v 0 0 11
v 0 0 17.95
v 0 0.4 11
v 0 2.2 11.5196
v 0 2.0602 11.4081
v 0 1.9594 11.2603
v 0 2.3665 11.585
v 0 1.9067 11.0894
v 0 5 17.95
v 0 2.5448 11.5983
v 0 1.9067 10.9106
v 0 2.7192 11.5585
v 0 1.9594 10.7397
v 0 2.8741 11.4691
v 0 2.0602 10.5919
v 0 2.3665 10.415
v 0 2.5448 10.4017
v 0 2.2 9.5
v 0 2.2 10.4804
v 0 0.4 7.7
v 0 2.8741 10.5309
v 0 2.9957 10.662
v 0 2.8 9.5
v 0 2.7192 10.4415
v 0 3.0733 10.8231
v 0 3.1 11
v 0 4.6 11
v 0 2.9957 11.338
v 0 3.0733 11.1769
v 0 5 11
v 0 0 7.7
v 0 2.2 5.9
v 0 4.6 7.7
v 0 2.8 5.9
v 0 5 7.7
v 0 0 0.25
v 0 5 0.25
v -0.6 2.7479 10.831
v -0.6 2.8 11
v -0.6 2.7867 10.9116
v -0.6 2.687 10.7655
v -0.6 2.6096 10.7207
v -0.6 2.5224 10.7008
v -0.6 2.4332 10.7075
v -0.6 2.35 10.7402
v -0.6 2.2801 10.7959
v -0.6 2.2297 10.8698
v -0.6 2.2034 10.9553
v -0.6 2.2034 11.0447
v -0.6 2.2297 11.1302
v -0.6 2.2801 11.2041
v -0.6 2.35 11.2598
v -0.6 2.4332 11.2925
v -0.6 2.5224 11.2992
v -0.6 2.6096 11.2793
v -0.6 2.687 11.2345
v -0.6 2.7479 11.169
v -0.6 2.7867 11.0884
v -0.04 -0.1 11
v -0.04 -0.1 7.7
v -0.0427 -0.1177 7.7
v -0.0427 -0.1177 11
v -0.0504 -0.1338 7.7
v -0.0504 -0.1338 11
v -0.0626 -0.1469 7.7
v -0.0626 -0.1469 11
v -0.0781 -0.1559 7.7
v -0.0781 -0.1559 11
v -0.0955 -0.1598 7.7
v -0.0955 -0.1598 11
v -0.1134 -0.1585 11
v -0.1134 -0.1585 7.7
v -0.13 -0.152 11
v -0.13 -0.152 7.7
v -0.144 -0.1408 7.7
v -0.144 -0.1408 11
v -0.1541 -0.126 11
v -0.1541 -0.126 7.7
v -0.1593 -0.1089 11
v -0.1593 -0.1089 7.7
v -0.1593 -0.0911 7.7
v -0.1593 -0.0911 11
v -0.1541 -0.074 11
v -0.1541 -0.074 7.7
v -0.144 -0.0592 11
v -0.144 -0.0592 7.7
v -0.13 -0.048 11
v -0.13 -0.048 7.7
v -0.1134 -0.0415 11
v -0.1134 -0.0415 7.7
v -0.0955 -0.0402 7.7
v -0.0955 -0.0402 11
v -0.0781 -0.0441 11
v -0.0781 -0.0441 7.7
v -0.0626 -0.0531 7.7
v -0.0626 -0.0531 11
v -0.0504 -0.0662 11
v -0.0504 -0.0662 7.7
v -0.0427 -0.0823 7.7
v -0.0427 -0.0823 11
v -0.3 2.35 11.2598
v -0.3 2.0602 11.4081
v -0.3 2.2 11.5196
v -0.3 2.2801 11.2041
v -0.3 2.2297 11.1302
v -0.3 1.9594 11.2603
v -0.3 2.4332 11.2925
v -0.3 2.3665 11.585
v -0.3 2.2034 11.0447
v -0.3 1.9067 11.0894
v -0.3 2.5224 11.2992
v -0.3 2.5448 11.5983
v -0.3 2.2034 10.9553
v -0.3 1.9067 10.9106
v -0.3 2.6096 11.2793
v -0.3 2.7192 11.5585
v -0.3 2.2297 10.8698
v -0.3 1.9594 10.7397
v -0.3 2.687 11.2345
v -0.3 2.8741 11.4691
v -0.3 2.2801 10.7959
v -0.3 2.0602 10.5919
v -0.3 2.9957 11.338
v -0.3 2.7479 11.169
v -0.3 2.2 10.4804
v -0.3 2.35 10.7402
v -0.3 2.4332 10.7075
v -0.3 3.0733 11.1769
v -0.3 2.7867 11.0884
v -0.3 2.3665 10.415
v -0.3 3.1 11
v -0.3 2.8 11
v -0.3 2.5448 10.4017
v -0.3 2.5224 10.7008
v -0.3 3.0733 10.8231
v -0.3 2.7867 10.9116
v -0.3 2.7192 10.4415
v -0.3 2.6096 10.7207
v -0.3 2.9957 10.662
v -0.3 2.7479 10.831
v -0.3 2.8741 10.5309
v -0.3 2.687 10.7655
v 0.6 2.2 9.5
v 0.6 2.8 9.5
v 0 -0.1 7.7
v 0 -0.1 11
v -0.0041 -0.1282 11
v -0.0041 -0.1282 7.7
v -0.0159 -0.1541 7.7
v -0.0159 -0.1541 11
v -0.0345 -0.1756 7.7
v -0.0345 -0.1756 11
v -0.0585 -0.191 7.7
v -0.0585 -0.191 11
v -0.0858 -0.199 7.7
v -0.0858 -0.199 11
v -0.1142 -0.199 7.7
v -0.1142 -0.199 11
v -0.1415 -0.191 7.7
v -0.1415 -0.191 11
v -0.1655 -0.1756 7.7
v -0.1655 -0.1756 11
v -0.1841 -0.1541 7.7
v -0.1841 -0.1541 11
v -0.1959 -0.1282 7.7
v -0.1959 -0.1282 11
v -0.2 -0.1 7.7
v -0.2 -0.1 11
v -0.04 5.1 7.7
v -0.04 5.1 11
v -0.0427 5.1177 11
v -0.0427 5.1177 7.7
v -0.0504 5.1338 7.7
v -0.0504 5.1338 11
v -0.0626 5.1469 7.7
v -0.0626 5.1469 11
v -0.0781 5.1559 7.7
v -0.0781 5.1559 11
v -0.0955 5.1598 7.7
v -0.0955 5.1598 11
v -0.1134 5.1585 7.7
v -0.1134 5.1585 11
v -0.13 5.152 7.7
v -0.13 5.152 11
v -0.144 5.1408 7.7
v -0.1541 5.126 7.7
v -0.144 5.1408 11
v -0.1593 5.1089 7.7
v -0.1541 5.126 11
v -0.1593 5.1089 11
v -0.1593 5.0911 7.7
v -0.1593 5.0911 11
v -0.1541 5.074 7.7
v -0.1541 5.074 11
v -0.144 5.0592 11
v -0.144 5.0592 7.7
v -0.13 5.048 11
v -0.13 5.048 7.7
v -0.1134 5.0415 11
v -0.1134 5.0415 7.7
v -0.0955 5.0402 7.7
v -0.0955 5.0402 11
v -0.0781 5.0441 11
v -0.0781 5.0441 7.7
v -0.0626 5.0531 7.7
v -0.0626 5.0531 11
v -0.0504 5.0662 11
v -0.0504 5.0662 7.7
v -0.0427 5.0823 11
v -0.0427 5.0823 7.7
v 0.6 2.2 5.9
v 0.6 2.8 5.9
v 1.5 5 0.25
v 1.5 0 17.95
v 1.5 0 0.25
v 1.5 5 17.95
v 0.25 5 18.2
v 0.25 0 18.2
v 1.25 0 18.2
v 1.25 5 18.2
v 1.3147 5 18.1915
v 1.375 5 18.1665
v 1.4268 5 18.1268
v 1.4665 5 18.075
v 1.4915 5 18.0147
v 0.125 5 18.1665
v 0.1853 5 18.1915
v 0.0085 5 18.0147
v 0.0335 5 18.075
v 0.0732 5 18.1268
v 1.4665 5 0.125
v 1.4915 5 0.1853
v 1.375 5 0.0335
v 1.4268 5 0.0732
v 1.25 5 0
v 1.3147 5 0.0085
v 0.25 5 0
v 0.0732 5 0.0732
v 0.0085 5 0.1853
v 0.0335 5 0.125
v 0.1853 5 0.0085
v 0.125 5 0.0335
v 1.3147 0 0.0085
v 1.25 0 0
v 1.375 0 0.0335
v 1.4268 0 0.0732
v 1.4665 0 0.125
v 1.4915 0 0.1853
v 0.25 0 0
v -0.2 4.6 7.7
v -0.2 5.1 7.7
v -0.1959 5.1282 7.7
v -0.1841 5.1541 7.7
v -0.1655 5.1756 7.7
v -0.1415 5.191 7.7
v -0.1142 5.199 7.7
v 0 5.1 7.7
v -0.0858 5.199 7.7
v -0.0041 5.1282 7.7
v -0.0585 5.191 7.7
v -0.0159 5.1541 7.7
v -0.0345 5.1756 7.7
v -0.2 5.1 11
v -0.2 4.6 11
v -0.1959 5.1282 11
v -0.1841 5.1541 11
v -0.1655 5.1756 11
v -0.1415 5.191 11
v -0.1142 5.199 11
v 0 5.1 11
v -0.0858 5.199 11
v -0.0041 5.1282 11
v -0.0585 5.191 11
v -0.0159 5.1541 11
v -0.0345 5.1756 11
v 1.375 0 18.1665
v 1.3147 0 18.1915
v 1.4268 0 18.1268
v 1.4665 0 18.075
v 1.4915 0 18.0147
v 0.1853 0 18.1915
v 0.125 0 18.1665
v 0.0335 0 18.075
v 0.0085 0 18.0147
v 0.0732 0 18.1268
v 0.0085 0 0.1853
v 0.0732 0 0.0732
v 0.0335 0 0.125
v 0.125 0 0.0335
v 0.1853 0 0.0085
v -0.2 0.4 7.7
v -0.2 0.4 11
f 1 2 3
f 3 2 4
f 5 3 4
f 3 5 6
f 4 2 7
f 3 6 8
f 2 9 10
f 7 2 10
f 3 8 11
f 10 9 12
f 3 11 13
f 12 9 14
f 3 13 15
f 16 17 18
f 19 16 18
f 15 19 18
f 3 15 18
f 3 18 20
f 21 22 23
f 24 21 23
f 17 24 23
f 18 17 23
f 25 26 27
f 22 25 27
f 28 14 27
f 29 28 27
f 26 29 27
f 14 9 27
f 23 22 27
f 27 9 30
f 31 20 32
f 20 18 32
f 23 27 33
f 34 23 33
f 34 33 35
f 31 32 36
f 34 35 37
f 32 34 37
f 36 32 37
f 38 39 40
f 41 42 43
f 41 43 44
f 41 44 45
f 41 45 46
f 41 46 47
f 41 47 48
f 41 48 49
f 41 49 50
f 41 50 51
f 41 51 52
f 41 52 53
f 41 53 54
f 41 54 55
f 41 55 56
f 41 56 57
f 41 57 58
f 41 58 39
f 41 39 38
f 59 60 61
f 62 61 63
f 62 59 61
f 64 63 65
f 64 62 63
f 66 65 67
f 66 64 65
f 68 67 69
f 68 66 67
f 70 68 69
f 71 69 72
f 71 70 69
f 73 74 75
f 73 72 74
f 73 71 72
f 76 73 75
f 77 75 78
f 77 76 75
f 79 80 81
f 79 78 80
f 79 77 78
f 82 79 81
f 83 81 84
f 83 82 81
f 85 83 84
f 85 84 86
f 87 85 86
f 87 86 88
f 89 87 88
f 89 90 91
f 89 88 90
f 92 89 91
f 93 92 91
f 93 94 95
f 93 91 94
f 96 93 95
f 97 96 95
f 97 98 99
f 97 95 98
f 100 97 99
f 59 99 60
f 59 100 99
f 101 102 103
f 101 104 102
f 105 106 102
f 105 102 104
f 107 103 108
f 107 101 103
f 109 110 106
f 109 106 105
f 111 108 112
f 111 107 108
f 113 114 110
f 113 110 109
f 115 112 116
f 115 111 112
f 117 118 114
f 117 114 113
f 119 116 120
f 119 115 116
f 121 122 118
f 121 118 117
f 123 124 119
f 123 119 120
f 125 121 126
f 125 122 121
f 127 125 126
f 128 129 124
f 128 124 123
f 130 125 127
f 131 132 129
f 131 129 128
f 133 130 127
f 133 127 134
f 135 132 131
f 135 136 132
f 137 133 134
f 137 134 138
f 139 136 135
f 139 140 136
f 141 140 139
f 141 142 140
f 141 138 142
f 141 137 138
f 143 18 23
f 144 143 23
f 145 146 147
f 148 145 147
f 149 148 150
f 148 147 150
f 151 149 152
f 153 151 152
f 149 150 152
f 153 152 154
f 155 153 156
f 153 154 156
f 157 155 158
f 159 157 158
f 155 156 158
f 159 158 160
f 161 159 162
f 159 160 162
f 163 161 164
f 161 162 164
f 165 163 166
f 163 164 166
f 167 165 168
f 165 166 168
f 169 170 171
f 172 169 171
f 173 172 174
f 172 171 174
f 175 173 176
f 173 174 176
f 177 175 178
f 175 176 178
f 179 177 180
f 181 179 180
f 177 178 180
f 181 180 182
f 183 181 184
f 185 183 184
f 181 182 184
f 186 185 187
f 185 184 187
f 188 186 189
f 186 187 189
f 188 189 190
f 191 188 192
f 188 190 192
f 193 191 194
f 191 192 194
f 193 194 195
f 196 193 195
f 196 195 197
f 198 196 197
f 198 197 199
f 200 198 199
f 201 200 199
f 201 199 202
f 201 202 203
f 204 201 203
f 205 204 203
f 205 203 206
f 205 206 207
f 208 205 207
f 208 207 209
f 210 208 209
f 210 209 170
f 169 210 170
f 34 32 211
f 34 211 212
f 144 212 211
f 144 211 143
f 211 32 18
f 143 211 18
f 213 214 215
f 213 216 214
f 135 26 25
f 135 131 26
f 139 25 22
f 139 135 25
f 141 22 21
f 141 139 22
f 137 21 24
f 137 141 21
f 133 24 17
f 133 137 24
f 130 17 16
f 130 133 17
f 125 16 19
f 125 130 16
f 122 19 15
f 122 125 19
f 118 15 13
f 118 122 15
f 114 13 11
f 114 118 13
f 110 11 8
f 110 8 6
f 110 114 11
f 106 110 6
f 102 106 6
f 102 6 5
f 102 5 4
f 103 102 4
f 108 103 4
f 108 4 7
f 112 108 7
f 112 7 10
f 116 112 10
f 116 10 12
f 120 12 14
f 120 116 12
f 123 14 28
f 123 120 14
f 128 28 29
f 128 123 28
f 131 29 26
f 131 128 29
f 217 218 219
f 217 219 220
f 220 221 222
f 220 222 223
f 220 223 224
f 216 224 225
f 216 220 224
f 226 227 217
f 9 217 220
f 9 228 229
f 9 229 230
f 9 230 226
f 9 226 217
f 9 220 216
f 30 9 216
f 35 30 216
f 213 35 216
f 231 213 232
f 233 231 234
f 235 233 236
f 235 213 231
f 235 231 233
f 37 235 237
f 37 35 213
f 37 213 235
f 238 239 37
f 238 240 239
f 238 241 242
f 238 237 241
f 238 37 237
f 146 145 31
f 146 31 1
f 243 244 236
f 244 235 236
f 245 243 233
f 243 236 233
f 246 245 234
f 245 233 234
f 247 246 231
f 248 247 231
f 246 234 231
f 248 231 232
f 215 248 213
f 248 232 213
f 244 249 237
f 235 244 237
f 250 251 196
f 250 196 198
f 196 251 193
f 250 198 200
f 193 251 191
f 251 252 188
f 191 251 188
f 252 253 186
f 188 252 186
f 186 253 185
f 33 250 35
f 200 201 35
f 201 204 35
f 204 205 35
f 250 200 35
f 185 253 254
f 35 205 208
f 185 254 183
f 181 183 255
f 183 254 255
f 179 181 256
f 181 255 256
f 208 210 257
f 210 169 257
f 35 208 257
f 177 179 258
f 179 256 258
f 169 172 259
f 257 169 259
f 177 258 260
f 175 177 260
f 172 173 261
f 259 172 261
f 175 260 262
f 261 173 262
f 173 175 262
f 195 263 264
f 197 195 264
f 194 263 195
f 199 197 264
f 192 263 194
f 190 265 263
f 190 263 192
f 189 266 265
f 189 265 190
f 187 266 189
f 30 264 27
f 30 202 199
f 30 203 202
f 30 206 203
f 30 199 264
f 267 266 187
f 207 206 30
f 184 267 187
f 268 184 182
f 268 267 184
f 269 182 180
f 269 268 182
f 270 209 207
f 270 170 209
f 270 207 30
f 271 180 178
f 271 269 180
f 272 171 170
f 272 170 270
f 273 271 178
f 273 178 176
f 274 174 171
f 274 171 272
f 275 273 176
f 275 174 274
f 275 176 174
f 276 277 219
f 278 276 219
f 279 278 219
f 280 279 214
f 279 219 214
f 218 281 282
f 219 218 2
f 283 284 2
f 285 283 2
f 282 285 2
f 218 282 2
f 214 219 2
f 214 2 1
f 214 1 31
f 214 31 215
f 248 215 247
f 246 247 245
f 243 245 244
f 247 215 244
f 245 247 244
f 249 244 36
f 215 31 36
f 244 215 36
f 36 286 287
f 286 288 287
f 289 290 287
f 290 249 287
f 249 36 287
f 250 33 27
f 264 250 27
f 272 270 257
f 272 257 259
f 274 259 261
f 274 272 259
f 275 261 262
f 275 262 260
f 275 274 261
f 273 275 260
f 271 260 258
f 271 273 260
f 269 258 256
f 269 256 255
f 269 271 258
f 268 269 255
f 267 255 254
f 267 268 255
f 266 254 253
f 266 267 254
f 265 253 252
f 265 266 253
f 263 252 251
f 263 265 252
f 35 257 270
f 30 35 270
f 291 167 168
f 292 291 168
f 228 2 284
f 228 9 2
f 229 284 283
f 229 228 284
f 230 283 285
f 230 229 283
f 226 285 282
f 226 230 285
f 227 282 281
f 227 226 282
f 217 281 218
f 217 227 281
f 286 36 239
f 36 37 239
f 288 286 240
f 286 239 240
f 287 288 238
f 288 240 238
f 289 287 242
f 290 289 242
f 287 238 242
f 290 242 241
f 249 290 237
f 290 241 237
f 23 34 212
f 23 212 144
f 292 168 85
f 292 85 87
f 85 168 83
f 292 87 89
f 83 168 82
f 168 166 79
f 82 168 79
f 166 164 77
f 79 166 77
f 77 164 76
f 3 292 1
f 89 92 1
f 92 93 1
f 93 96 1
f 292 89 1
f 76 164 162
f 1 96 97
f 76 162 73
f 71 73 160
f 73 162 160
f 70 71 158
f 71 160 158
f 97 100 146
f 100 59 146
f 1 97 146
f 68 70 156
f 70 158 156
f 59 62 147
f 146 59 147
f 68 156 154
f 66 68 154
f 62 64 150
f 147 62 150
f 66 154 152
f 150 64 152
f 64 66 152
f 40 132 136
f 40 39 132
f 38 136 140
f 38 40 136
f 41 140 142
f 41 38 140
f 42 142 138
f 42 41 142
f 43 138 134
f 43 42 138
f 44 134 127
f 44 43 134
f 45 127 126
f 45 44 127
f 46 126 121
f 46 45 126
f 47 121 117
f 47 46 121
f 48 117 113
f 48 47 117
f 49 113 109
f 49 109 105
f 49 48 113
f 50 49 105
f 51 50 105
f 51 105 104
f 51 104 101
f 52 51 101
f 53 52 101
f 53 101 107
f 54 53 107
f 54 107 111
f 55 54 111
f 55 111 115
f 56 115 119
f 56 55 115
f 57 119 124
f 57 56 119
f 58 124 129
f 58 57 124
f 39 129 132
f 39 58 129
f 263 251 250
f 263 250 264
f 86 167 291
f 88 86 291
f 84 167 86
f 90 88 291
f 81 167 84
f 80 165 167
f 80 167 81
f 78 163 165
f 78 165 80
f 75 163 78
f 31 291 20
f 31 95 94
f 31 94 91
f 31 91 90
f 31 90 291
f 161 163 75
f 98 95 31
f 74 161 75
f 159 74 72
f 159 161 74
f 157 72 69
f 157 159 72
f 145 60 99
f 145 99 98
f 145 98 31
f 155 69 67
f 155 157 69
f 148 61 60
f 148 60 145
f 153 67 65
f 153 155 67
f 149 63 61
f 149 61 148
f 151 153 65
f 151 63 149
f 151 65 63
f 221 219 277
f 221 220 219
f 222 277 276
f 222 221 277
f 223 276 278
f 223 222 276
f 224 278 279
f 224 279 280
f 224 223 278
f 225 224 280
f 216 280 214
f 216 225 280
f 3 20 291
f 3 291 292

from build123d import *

# Parameters (mm, degrees)
SKETCH2_W           = 18.2
SKETCH2_H           = 5
BOSS_EXTRUDE1_DEPTH = 1.5
SKETCH4_W           = 3.6
SKETCH4_H           = 0.6
CUT_EXTRUDE1_DEPTH  = 0.6
SKETCH5_W           = 3.3
SKETCH5_H           = 0.5
BOSS_EXTRUDE2_DEPTH = 0.2
BOSS_EXTRUDE5_DEPTH = 3.3
SKETCH9_R           = 0.06
CUT_EXTRUDE5_DEPTH  = 12
FILLET1_R           = 0.25


with BuildPart() as part:
    # Sketch2 → Boss-Extrude1 (new body)
    with BuildSketch(Plane(origin=(0, 0, 0), x_dir=(0, 0, -1), z_dir=(1, 0, 0))):
        with Locations((-9.1, 2.5)):
            Rectangle(SKETCH2_W, SKETCH2_H)
    extrude(amount=BOSS_EXTRUDE1_DEPTH)

    # Sketch3 → Revolve1 (revolve)
    with BuildSketch(Plane.XY.offset(11)):
        Polygon((0, 2.5), (0, 3.1), (-0.3, 3.1), (-0.3, 2.8), (-0.6, 2.8), (-0.6, 2.5), align=None)
    revolve(axis=Axis((0, 2.5, 11), (-1, 0, 0)))

    # Sketch4 → Cut-Extrude1 (cut)
    with BuildSketch(Plane.ZY):
        with Locations((7.7, 2.5)):
            Rectangle(SKETCH4_W, SKETCH4_H)
    extrude(amount=-CUT_EXTRUDE1_DEPTH, mode=Mode.SUBTRACT)

    # Sketch5 → Boss-Extrude2 (add)
    with BuildSketch(Plane.ZY):
        with Locations((9.35, 4.85)):
            Rectangle(SKETCH5_W, SKETCH5_H)
    boss_extrude2 = extrude(amount=BOSS_EXTRUDE2_DEPTH)

    # Sketch6 → Boss-Extrude5 (add)
    with BuildSketch(Plane.XY.offset(11)):
        with BuildLine():
            Line((-0.2, 5.1), (0, 5.1))
            ThreePointArc((0, 5.1), (-0.1, 5.2), (-0.2, 5.1))
        make_face()
    boss_extrude5 = extrude(amount=-BOSS_EXTRUDE5_DEPTH)

    # Sketch9 → Cut-Extrude5 (cut, through all)
    with BuildSketch(Plane.XY.offset(11)):
        with Locations((-0.1, 5.1)):
            Circle(SKETCH9_R)
    cut_extrude5 = extrude(amount=-CUT_EXTRUDE5_DEPTH, mode=Mode.SUBTRACT)

    # Mirror8: Boss-Extrude2, Boss-Extrude5, Cut-Extrude5 across plane
    add(boss_extrude2.mirror(Plane.ZX.offset(2.5)))
    add(boss_extrude5.mirror(Plane.ZX.offset(2.5)))
    add(cut_extrude5.mirror(Plane.ZX.offset(2.5)), mode=Mode.SUBTRACT)

    # Fillet1
    fillet1_edges = [part.edges().sort_by_distance(p)[0] for p in [
        (1.5, 2.5, 18.2),
        (0, 2.5, 18.2),
        (0, 2.5, 0),
        (1.5, 2.5, 0),
    ]]
    fillet(fillet1_edges, radius=FILLET1_R)


solid = part.part
